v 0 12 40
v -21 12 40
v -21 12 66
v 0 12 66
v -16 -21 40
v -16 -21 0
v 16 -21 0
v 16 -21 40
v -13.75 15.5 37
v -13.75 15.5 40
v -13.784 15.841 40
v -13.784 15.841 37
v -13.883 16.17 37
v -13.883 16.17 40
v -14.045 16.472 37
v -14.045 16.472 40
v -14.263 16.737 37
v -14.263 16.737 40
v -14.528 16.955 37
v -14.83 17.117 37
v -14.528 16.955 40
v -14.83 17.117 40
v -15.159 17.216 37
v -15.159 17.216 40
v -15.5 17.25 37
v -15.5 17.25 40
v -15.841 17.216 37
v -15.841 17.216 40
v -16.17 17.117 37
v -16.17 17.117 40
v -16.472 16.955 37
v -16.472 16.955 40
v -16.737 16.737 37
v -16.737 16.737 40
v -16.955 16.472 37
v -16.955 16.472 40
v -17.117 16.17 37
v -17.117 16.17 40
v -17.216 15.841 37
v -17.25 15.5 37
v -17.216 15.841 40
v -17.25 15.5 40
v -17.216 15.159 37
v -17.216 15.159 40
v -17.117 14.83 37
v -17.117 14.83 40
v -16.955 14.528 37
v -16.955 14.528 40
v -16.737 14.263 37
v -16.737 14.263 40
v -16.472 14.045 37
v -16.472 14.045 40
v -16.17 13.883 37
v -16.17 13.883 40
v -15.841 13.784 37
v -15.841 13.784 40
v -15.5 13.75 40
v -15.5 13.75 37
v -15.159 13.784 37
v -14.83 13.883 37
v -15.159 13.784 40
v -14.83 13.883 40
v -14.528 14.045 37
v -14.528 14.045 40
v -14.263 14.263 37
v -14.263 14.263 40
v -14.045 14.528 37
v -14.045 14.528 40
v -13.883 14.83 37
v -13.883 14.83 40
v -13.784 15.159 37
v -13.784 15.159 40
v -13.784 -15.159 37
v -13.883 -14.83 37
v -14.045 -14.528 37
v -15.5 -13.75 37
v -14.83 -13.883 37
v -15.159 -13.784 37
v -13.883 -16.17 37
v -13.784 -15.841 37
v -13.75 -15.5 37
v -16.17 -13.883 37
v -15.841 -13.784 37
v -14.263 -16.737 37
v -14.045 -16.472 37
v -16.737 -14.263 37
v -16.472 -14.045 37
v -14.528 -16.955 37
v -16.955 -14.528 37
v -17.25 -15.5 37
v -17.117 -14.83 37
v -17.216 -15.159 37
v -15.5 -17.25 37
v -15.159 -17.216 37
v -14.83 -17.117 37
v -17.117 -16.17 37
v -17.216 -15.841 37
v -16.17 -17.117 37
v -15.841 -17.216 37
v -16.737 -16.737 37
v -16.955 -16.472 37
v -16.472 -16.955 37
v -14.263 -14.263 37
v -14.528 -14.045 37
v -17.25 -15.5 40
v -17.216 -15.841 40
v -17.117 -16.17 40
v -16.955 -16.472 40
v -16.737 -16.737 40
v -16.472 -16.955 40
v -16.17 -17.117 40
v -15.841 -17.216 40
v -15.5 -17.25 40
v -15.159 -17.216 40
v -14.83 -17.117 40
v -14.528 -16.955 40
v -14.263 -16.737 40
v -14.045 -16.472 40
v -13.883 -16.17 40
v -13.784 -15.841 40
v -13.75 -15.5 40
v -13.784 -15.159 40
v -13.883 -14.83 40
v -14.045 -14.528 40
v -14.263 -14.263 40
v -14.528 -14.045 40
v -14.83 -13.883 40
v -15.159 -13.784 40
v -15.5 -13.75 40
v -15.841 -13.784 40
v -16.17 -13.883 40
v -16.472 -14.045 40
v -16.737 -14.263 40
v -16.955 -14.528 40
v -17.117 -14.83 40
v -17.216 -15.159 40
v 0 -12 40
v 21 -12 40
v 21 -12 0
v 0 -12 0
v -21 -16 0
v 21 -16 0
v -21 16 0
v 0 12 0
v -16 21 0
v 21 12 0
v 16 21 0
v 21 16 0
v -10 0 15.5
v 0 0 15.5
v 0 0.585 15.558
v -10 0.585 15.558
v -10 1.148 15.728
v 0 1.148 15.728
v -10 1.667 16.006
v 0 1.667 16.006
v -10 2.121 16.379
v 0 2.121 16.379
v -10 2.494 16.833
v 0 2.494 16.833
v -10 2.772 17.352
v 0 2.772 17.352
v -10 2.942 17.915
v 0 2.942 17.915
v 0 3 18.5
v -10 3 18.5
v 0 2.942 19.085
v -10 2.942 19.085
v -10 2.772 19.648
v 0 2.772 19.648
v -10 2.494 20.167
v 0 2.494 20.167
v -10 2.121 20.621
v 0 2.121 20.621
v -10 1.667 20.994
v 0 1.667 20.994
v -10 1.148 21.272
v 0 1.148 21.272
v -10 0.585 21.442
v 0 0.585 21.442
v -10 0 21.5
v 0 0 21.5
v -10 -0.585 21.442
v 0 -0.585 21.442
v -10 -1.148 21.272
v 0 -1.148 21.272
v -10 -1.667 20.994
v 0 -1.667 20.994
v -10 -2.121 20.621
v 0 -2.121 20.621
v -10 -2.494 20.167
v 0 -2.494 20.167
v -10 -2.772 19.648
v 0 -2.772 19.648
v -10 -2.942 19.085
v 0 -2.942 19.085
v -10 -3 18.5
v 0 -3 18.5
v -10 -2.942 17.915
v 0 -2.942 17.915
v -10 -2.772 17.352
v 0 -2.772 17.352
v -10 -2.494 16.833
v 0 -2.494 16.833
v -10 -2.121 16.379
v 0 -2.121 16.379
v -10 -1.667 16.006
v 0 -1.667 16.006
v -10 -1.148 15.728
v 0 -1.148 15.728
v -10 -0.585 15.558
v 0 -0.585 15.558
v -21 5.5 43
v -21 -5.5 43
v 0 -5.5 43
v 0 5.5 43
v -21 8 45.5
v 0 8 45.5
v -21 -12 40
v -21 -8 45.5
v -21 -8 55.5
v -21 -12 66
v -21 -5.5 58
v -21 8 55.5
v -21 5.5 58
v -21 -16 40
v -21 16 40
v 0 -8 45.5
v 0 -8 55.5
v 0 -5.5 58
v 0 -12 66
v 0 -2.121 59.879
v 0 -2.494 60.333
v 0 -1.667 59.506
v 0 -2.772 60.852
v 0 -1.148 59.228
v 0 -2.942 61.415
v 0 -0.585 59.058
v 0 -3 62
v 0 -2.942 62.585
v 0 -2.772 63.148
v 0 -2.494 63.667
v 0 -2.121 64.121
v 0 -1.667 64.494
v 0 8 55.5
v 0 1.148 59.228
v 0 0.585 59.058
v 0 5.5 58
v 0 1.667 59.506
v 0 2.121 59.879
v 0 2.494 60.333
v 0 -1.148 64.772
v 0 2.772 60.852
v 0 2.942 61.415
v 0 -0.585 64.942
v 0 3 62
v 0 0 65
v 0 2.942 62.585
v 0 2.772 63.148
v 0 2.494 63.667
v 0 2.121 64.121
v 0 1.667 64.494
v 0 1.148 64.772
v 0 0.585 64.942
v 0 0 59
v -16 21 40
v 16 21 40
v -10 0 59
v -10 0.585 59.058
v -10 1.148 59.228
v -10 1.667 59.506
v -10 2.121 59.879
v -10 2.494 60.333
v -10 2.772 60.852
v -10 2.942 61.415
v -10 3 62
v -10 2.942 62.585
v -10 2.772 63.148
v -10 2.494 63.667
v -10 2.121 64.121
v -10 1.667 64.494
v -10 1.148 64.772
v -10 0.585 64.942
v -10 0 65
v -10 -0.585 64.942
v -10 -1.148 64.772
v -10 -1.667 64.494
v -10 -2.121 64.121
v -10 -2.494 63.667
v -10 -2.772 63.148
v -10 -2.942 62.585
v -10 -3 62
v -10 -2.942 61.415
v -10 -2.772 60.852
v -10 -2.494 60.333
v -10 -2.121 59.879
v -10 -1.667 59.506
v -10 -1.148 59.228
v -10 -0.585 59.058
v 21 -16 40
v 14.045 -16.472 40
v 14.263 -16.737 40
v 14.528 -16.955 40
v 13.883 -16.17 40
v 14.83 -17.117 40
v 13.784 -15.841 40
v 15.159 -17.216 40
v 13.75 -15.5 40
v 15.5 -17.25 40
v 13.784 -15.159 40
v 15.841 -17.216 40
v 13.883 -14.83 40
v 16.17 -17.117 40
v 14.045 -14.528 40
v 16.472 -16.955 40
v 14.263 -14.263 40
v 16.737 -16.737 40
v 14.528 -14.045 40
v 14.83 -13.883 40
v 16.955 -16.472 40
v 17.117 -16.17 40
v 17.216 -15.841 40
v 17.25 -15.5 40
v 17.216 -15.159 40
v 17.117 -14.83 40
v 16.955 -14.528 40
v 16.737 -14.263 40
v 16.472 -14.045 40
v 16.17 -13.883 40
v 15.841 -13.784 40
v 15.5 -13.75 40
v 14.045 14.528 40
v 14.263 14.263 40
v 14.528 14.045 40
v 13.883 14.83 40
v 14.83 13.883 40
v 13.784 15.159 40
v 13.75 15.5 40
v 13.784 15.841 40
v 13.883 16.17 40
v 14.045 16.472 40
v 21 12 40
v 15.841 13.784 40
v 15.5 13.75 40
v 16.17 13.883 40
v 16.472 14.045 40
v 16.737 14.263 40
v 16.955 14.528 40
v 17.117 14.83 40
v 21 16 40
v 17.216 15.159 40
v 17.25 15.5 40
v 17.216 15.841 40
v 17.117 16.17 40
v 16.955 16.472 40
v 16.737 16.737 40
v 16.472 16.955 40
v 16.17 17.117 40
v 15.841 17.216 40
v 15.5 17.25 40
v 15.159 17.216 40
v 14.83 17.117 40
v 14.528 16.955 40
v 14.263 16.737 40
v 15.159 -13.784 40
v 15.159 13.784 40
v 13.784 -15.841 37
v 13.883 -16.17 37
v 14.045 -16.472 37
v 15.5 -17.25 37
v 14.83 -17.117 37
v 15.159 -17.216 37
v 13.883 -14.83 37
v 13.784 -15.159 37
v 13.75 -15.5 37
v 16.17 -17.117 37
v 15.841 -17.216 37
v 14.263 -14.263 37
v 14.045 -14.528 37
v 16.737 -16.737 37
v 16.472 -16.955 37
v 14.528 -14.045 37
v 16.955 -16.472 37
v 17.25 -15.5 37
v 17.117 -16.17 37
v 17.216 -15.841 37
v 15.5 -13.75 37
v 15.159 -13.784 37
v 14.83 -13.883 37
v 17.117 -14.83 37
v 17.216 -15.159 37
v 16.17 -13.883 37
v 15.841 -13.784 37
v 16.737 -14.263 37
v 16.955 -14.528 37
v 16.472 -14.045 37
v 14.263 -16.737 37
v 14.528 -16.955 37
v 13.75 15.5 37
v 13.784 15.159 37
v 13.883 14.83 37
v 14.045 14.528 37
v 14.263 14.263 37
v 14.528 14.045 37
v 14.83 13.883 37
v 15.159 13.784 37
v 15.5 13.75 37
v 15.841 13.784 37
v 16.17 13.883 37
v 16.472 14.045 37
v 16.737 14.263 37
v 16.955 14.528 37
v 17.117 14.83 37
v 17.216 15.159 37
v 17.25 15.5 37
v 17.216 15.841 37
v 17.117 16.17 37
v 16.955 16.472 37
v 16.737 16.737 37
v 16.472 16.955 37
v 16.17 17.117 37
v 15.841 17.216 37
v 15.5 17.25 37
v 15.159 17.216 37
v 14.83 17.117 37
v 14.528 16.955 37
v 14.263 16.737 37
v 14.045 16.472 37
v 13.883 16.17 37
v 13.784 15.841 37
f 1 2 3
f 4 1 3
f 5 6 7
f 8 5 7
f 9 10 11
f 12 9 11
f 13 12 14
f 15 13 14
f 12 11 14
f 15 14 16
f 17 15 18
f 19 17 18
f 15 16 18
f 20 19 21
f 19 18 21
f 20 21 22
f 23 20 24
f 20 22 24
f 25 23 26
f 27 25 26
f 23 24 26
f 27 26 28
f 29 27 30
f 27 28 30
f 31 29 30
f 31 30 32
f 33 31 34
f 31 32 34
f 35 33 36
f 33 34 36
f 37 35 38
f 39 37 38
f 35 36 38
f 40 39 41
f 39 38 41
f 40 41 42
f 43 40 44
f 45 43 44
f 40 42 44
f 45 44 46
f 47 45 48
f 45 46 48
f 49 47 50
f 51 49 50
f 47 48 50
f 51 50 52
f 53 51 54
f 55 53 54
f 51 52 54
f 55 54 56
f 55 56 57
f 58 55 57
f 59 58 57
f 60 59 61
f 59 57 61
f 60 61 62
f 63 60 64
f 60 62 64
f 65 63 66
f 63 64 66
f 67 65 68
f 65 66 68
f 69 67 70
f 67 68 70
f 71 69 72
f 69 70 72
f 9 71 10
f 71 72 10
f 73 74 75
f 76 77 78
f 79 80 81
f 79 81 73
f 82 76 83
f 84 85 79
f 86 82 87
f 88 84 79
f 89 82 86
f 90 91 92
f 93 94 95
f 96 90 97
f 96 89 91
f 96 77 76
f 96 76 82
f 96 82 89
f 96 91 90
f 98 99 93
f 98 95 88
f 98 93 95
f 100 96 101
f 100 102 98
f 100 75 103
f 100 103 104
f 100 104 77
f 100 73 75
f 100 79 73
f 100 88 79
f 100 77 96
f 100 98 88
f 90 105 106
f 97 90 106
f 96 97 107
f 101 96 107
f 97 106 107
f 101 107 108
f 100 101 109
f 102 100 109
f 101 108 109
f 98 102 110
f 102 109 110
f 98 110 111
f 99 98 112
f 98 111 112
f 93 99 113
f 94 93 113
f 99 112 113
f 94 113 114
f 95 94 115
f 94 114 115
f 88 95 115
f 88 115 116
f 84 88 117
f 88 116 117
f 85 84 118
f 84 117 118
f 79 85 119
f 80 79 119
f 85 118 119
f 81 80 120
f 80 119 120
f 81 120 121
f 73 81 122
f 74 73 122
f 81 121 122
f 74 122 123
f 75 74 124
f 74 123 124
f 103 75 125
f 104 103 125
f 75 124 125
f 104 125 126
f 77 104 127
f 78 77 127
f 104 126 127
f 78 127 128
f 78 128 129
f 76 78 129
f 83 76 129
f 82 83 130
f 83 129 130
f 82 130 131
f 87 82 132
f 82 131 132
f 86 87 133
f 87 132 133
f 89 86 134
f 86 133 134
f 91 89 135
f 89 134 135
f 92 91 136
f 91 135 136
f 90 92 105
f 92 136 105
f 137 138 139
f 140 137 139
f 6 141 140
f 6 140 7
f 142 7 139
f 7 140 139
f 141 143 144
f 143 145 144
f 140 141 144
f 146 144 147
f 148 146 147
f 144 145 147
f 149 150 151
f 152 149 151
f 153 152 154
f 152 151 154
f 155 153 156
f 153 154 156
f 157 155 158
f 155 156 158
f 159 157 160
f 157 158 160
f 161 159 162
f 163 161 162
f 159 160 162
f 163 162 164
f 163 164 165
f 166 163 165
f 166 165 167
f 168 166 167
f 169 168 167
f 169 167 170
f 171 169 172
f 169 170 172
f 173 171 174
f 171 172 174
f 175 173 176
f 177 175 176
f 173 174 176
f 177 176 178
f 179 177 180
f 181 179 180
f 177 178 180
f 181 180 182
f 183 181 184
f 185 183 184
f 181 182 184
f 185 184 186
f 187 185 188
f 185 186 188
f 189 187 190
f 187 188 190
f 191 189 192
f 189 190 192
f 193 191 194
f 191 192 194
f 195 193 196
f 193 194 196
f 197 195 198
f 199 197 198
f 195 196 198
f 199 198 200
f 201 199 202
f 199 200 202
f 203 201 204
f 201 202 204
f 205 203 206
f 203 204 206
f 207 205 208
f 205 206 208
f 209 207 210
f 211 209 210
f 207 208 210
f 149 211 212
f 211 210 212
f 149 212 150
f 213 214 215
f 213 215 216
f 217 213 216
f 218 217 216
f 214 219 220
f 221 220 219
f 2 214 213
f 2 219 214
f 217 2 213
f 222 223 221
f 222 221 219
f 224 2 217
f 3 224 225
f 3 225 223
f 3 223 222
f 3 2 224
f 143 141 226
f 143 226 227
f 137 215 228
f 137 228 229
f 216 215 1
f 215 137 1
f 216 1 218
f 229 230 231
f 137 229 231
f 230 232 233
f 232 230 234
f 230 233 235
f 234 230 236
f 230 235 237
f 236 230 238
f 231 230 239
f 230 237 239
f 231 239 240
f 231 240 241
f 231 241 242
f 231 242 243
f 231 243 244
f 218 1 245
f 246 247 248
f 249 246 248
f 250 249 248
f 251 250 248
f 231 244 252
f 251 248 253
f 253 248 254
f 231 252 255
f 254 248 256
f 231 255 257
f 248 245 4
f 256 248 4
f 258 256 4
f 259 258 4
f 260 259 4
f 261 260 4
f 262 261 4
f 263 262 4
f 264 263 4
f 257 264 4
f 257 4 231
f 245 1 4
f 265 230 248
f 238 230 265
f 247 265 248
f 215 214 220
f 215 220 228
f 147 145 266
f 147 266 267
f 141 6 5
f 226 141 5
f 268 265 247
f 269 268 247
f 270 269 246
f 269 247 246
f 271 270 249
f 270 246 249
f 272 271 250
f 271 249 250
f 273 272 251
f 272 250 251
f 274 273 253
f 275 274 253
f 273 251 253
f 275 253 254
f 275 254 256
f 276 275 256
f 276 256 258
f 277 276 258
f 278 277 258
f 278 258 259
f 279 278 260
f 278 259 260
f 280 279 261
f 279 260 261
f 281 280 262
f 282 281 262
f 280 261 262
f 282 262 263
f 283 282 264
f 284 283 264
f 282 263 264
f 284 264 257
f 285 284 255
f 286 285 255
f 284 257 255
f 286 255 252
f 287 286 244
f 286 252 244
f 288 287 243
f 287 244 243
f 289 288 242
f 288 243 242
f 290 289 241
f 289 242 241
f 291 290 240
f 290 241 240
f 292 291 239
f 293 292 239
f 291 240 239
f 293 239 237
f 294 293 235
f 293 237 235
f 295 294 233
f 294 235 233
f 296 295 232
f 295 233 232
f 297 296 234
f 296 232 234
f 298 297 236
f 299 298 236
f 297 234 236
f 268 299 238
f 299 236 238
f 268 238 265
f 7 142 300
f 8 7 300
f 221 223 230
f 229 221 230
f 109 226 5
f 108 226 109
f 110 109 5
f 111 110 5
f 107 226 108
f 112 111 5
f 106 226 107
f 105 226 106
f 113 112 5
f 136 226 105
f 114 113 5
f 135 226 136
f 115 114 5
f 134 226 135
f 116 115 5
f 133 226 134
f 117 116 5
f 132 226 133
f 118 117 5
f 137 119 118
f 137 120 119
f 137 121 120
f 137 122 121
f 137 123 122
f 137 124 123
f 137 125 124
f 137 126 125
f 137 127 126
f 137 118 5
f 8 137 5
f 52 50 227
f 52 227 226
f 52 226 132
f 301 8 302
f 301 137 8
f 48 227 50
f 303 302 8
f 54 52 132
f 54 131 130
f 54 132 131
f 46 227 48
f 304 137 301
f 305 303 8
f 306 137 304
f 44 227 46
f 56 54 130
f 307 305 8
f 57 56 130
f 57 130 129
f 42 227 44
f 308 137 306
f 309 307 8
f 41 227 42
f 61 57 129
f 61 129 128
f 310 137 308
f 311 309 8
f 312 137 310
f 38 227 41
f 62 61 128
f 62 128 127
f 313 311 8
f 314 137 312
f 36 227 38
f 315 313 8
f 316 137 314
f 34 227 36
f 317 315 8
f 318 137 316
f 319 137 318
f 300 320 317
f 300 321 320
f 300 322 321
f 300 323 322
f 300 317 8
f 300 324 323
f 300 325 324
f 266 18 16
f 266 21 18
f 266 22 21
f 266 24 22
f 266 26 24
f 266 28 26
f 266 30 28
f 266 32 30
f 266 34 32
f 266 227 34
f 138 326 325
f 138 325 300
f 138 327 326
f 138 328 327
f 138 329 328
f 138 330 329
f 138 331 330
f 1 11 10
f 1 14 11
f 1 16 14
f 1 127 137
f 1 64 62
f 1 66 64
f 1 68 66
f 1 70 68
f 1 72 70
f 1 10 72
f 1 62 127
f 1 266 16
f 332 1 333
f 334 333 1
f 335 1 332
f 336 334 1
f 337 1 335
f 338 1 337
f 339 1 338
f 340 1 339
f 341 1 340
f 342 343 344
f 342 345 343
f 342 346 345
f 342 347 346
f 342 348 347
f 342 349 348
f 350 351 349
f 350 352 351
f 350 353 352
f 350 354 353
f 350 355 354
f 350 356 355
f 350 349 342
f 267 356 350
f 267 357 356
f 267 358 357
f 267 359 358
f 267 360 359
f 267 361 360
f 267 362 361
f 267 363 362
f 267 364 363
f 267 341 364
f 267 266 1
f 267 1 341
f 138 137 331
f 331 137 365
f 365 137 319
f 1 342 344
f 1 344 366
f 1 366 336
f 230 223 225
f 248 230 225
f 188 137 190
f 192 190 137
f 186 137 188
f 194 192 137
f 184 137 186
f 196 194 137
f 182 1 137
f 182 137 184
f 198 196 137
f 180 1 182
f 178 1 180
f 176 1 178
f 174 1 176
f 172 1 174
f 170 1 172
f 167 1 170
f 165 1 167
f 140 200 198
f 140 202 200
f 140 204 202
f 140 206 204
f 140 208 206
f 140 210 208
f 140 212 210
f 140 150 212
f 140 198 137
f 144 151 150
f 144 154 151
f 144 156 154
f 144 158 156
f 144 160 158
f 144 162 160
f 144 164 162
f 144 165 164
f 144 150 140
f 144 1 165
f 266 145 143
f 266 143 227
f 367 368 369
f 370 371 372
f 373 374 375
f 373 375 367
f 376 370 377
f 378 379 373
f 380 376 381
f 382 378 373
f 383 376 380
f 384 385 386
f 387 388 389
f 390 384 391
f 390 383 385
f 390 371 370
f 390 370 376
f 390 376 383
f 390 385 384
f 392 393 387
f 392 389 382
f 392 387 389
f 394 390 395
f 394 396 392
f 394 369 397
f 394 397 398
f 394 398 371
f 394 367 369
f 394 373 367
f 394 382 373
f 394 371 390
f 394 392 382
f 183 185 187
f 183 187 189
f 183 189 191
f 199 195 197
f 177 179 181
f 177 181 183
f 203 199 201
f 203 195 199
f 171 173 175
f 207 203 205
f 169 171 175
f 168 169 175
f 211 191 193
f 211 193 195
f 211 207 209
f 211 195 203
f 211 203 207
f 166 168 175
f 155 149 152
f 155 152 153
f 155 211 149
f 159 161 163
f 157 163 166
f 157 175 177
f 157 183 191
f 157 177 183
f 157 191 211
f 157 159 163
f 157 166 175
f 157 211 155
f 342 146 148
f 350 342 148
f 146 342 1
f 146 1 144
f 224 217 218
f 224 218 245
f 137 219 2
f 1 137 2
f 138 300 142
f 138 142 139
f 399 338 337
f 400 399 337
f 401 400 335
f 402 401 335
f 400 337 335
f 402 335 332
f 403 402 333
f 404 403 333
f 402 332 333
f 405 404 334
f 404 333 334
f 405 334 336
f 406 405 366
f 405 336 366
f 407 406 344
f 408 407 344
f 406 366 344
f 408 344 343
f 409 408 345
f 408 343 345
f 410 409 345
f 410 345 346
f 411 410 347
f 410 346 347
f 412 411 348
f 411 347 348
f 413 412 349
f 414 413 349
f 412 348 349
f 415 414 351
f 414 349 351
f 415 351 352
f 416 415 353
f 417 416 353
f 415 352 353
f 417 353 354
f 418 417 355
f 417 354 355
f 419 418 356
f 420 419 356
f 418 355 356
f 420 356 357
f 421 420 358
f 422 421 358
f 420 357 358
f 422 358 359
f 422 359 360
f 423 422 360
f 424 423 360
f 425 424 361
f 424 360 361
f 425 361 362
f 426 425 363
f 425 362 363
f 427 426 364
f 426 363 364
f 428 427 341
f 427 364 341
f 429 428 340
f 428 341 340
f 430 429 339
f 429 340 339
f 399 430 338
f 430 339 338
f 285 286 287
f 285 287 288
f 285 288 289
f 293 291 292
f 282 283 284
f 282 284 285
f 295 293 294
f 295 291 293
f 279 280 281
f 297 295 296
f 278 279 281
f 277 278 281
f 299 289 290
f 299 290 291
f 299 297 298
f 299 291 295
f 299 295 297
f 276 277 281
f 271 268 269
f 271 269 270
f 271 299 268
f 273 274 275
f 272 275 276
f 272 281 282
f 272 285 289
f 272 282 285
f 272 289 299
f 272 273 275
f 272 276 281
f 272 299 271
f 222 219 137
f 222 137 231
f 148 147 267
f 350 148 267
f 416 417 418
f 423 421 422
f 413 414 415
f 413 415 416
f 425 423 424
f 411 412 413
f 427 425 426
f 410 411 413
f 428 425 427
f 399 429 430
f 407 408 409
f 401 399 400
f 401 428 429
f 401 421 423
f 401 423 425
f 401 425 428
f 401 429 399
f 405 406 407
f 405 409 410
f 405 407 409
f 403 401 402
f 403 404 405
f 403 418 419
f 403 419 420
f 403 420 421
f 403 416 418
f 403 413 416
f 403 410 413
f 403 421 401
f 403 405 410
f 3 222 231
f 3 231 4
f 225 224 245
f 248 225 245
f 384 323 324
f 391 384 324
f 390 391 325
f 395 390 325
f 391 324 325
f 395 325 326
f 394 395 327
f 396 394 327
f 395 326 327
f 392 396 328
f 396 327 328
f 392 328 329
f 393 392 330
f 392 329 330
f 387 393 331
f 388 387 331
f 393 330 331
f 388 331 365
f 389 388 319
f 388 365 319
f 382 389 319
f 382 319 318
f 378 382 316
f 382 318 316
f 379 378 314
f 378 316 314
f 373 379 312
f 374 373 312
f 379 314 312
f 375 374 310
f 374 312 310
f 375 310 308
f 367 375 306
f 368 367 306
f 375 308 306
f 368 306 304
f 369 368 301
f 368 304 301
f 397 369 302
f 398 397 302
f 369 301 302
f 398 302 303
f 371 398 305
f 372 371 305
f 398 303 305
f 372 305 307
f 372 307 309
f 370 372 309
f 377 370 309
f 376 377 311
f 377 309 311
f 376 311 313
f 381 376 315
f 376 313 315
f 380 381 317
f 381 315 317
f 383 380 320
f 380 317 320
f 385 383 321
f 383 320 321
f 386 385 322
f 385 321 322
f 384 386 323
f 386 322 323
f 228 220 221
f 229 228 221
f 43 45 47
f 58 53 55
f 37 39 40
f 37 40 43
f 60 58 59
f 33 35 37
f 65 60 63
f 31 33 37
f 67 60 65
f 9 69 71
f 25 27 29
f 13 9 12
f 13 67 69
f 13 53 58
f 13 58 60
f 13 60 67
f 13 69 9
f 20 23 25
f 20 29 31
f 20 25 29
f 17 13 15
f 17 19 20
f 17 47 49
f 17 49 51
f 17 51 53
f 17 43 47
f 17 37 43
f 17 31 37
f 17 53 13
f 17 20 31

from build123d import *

# Parameters (mm, degrees)
SKETCH_1_W          = 42
SKETCH_1_H          = 42
EXTRUDE_1_DEPTH     = 40
CHAMFER_1_SIZE      = 5
SKETCH_4_R          = 1.75
CUT_EXTRUDE_1_DEPTH = 3
SKETCH_5_W          = 26
SKETCH_5_H          = 24
SKETCH_5_W_2        = 15
SKETCH_5_H_2        = 16
EXTRUDE_2_DEPTH     = 21
SKETCH_7_W          = 40
SKETCH_7_H          = 24
CUT_EXTRUDE_3_DEPTH = 21
SKETCH_6_R          = 3
CUT_EXTRUDE_2_DEPTH = 10
CHAMFER_2_SIZE      = 2.5


with BuildPart() as part:
    # 草圖1 → 填料-伸長1 (new body)
    with BuildSketch(Plane.XY):
        Rectangle(SKETCH_1_W, SKETCH_1_H)
    extrude(amount=EXTRUDE_1_DEPTH)

    # 導角1
    chamfer_1_edges = [part.edges().sort_by_distance(p)[0] for p in [
        (-21, 21, 20),
        (21, 21, 20),
        (21, -21, 20),
        (-21, -21, 20),
    ]]
    chamfer(chamfer_1_edges, length=CHAMFER_1_SIZE)

    # 草圖4 → 除料-伸長1 (cut)
    with BuildSketch(Plane.XY.offset(40)):
        with Locations((-15.5, 15.5)):
            Circle(SKETCH_4_R)
        with Locations(Location((-15.5, -15.5, 0), (0, 0, 180))):
            Circle(SKETCH_4_R)
        with Locations((15.5, -15.5)):
            Circle(SKETCH_4_R)
        with Locations(Location((15.5, 15.5, 0), (0, 0, 180))):
            Circle(SKETCH_4_R)
    extrude(amount=-CUT_EXTRUDE_1_DEPTH, mode=Mode.SUBTRACT)

    # 草圖7 → 除料-伸長3 (cut)
    with BuildSketch(Plane(origin=(21, 0, 0), x_dir=(0, 0, -1), z_dir=(1, 0, 0))):
        with Locations((-20, 0)):
            Rectangle(SKETCH_7_W, SKETCH_7_H)
    extrude(amount=-CUT_EXTRUDE_3_DEPTH, mode=Mode.SUBTRACT)


with BuildPart() as body_2:
    # 草圖5 → 填料-伸長2 (new body)
    with BuildSketch(Plane.ZY.offset(21)):
        with Locations((53, 0)):
            Rectangle(SKETCH_5_W, SKETCH_5_H)
        with Locations((50.5, 0)):
            Rectangle(SKETCH_5_W_2, SKETCH_5_H_2, mode=Mode.SUBTRACT)
    extrude(amount=-EXTRUDE_2_DEPTH)


with BuildPart() as cut_extrude_2_tool:
    # 草圖6 → 除料-伸長2 (new body)
    with BuildSketch(Plane(origin=(0, 0, 0), x_dir=(0, 0, -1), z_dir=(1, 0, 0))):
        with Locations((-62, 0)):
            Circle(SKETCH_6_R)
        with Locations((-18.5, 0)):
            Circle(SKETCH_6_R)
    extrude(amount=-CUT_EXTRUDE_2_DEPTH)


with BuildPart() as part_1:
    add(part.part)

    # 除料-伸長2: cut by cut_extrude_2_tool
    add(cut_extrude_2_tool.part, mode=Mode.SUBTRACT)


with BuildPart() as body_2_1:
    add(body_2.part)

    # 除料-伸長2: cut by cut_extrude_2_tool
    add(cut_extrude_2_tool.part, mode=Mode.SUBTRACT)

    # 導角2
    chamfer_2_edges = [body_2_1.edges().sort_by_distance(p)[0] for p in [
        (-10.5, -8, 43),
        (-10.5, 8, 43),
        (-10.5, 8, 58),
        (-10.5, -8, 58),
    ]]
    chamfer(chamfer_2_edges, length=CHAMFER_2_SIZE)


solid = Compound([part_1.part, body_2_1.part])
